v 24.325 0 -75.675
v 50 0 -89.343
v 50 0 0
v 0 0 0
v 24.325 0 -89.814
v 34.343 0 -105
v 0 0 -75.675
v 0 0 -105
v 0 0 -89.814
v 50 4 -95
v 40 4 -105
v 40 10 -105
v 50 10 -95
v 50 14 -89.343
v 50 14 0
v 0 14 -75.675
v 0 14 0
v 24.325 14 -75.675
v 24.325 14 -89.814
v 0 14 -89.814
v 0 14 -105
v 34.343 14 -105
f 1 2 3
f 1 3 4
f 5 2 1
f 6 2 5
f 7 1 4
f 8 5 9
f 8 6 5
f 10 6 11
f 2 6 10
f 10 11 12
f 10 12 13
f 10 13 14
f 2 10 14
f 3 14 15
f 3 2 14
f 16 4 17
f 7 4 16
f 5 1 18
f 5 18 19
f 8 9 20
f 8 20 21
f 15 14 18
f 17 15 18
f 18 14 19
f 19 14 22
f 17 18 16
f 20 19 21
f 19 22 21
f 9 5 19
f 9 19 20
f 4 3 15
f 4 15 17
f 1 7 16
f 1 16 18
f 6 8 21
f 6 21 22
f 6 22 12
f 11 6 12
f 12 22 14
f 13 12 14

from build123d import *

# Parameters (mm, degrees)
EXTRUDE_1_DEPTH = 14
CHAMFER_1_SIZE  = 4


with BuildPart() as part:
    # 草图1 → 凸台-拉伸1 (new body)
    with BuildSketch(Plane(origin=(0, 0, 0), x_dir=(1, 0, 0), z_dir=(0, 1, 0))):
        Polygon((40, 105), (50, 95), (50, 0), (0, 0), (0, 75.675047551), (24.325372692, 75.675047551), (24.325372692, 89.813954871), (0, 89.813954871), (0, 105), align=None)
    extrude(amount=EXTRUDE_1_DEPTH)

    # 倒角1
    chamfer_1_edges = [part.edges().sort_by_distance(p)[0] for p in [
        (45, 0, -100),
        (45, 14, -100),
    ]]
    chamfer(chamfer_1_edges, length=CHAMFER_1_SIZE)


solid = part.part
